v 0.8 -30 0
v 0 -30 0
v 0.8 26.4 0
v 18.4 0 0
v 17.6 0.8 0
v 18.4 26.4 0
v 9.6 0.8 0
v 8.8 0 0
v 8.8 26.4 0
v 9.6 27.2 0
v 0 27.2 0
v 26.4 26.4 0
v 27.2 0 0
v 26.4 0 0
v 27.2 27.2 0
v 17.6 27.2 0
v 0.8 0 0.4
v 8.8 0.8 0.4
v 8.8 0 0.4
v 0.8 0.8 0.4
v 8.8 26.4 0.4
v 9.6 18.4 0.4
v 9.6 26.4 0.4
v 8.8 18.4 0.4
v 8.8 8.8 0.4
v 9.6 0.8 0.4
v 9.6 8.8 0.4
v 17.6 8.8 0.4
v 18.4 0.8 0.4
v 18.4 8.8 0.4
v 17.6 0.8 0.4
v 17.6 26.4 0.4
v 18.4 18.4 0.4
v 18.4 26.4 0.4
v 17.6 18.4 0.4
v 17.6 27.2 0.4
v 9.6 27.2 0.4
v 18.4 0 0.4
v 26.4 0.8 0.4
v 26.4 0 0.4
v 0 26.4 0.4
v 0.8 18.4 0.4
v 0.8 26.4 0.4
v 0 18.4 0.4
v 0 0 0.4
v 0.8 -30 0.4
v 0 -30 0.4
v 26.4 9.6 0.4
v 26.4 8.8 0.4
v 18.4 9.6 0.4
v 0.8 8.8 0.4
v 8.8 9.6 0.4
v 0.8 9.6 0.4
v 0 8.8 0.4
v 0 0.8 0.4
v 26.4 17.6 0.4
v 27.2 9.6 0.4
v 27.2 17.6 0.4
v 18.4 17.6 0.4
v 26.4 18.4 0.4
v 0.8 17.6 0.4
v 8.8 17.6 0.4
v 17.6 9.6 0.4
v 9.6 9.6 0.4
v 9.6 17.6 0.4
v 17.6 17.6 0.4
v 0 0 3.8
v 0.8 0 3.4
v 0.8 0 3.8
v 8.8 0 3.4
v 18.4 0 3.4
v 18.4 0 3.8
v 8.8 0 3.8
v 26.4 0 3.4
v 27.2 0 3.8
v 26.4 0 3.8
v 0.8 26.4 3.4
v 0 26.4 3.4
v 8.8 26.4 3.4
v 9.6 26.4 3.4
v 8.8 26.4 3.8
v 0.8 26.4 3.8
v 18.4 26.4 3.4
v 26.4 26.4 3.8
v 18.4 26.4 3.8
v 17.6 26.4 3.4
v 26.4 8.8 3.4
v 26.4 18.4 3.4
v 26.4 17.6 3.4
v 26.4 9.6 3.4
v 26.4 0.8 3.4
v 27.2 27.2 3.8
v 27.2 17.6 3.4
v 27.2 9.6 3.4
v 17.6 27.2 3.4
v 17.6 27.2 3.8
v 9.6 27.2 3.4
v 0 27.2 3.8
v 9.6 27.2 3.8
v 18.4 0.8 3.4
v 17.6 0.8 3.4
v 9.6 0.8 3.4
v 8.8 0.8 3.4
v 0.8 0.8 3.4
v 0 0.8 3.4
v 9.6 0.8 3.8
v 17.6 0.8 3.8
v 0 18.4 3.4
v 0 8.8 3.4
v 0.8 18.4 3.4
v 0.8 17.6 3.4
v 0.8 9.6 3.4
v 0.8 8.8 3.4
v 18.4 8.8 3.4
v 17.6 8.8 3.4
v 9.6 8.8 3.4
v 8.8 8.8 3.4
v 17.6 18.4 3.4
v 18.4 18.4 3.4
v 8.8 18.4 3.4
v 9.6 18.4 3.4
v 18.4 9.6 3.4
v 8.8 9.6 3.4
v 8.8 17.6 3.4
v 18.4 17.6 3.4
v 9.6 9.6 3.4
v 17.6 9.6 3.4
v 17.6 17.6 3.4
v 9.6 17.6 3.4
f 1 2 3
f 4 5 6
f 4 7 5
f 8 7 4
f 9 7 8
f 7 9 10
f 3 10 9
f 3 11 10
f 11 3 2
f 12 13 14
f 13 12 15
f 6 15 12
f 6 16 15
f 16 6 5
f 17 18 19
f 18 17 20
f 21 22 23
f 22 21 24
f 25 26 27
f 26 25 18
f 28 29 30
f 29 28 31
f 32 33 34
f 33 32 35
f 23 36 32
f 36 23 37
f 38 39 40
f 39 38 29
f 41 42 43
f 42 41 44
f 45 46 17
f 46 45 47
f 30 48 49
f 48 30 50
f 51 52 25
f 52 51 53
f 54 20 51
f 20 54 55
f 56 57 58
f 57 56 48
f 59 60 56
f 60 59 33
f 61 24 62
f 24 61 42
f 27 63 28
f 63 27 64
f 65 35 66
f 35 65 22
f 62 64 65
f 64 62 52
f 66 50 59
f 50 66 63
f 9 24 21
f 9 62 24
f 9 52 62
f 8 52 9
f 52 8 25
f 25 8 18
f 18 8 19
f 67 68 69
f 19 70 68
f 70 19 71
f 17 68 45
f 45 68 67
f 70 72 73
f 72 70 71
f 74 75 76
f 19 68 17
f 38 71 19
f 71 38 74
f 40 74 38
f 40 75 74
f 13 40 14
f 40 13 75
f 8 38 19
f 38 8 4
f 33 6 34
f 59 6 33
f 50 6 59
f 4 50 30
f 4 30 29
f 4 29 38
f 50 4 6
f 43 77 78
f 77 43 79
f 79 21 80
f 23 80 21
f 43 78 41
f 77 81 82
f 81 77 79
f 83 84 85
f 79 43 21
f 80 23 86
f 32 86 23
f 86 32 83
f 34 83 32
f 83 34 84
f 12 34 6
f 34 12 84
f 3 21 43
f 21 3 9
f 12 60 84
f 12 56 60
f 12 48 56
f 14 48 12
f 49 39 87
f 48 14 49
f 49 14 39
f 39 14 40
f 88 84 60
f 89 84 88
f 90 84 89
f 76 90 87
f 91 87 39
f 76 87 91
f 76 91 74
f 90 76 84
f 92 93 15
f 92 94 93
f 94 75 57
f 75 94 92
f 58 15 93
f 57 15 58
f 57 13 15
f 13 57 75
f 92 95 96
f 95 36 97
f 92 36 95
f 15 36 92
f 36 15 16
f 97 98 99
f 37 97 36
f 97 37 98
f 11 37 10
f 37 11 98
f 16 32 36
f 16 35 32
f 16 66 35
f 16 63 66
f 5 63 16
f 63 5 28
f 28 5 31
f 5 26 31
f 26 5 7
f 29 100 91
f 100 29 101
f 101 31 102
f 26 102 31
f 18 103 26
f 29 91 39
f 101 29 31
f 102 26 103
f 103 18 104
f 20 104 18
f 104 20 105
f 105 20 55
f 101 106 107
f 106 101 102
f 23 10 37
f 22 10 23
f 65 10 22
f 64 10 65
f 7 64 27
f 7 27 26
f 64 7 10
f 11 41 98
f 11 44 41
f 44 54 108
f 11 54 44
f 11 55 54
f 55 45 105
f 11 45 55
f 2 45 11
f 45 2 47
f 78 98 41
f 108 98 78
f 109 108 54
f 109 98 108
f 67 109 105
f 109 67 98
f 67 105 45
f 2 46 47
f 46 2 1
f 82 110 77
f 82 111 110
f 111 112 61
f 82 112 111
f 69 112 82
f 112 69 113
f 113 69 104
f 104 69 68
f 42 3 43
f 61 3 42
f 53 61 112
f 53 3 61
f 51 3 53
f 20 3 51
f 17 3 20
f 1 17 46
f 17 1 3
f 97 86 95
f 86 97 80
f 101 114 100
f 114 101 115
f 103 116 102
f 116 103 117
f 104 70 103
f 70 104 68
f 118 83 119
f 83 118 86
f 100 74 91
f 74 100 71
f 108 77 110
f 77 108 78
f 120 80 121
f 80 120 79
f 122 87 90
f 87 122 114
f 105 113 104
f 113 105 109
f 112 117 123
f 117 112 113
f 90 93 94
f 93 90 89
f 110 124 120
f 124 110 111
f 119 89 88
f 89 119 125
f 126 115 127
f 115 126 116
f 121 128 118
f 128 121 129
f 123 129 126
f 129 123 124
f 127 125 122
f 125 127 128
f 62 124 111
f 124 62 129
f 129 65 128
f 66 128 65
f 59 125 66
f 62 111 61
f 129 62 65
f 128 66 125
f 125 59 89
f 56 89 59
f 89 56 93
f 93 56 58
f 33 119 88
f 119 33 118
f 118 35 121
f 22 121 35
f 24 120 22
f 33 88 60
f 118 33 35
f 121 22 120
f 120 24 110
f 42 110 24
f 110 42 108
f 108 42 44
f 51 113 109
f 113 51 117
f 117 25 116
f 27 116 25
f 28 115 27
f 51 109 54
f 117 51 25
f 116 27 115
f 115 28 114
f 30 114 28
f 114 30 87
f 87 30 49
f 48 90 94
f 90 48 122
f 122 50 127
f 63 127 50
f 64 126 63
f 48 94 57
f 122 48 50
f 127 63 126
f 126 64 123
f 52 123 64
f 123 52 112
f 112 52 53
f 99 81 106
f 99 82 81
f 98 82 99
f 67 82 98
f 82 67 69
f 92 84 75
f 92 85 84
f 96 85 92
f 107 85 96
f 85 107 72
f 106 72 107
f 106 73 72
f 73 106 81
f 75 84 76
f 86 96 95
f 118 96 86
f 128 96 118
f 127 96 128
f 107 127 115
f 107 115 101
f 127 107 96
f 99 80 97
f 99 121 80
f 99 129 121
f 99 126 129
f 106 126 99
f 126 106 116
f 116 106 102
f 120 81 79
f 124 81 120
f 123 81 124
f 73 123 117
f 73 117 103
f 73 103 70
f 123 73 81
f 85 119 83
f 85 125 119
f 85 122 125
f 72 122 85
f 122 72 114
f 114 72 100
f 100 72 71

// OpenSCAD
// file: ../../api/v3/reporting.scad
//////////////////////////////////////////////////////////////////////
// LibFile: reporting.scad
// Project: Grid Stack
// FileGroup: API v3 Reporting
// FileSummary: Console report for immutable direct and positive-gap coupons.
// Role: Records the exact environment, dimensions, support strategy, path
//       lengths, qualification status, and deposited-layer counts.
// Requires: API v3 indexes, mathematics, and path generator.
// Exports: report_structural_coupon_object().
//////////////////////////////////////////////////////////////////////

function _bridge_status3(span, process) =
    span <= process[PX3_BRIDGE_MAX]
        ? "within_owner_tested_limit"
        : "exploratory_beyond_owner_tested_limit";

module report_structural_coupon_object(object, report_level = "full") {
    material = object[SCO_MATERIAL];
    nozzle = object[SCO_NOZZLE];
    printer = object[SCO_PRINTER];
    process = object[SCO_PROCESS];
    boundary = object[SCO_BOUNDARY];
    gap = object[SCO_CLEAR_GAP];
    strategy = object[SCO_SUPPORT_STRATEGY];

    echo("--- Grid Stack immutable structural coupon ---");
    echo(str("Object: ", object[SCO_NAME], " revision ", object[SCO_REVISION]));
    echo(str("API/schema: ", object[SCO_REQUIRED_API], "/",
        object[SCO_SCHEMA_VERSION]));
    echo(str("Release/base commit: ", object[SCO_SOURCE_RELEASE], " / ",
        object[SCO_FRAMEWORK_BASE_COMMIT]));
    echo(str("Material/nozzle/printer: ", material[MAT3_FAMILY], " / ",
        nozzle[NZ3_DIAMETER], " mm / ", printer[PRN3_NAME]));
    echo(str("Cells: ", boundary[B3_CELLS_X], " x ", boundary[B3_CELLS_Y]));
    echo(str("Clear spans: ", boundary[B3_CLEAR_SPAN_X], " x ",
        boundary[B3_CLEAR_SPAN_Y], " mm"));
    echo(str("Span status: ",
        _bridge_status3(boundary[B3_CLEAR_SPAN_X], process)));
    echo(str("Outside size: ", boundary_size_x3(boundary, process, nozzle),
        " x ", boundary_size_y3(boundary, process, nozzle), " mm"));
    echo(str("Primitive trace: ", trace_width3(nozzle), " x ",
        trace_height3(process), " mm"));
    echo(str("Structural strand: ", strand_width3(process, nozzle), " x ",
        strand_height3(process), " mm"));
    echo(str("Clear vertical gap: ", gap, " mm"));
    echo(str("Support strategy: ", strategy));
    echo(str("Total modeled height: ", coupon_total_height3(object), " mm"));

    if (report_level == "full") {
        if (strategy == "direct_orthogonal") {
            lower = coupon_path(
                boundary, process, nozzle, 0, object[SCO_LEAD_IN]
            );
            upper = coupon_path(boundary, process, nozzle, 90, 0);
            echo(str("Lower/upper path lengths: ", path_length3(lower),
                " / ", path_length3(upper), " mm"));
            echo(str("Deposited layers: ", 2 * process[PX3_HEIGHT_PASSES]));
        }
        else {
            witness = coupon_path(
                boundary, process, nozzle, 90, object[SCO_LEAD_IN]
            );
            riser = coupon_path(boundary, process, nozzle, 0, 0);
            test = coupon_path(boundary, process, nozzle, 90, 0);
            echo(str("Witness/riser/test path lengths: ",
                path_length3(witness), " / ", path_length3(riser), " / ",
                path_length3(test), " mm"));
            echo(str("Riser deposited layers: ", round(gap_layer_count3(object))));
            echo(str("Total deposited layers: ",
                2 * process[PX3_HEIGHT_PASSES] +
                round(gap_layer_count3(object))));
        }
        echo(str("Status: ", object[SCO_STATUS]));
        echo(str("Notes: ", object[SCO_NOTES]));
    }
}
// file: ../../api/v3/validation.scad
//////////////////////////////////////////////////////////////////////
// LibFile: validation.scad
// Project: Grid Stack
// FileGroup: API v3 Validation
// FileSummary: Validates immutable environment records, count boundaries,
//              support strategy, path continuity, and layer quantization.
// Role: Rejects incompatible or physically floating recipes before geometry
//       is generated.
// Requires: API v3 indexes, mathematics, and path generator.
// Exports: validate_structural_coupon_object().
//////////////////////////////////////////////////////////////////////

module _validate_path3(points, boundary, orientation, lead_in) {
    run_count = orientation == 0
        ? boundary_strand_count_y3(boundary)
        : boundary_strand_count_x3(boundary);

    assert(len(points) == expected_coupon_point_count3(run_count, lead_in),
        "API v3 coupon path has an unexpected point count.");
    assert(!path_has_zero_segment3(points),
        "API v3 coupon path contains a zero-length segment.");
    assert(path_axis_aligned3(points),
        "API v3 coupon path must remain axis-aligned.");
    assert(points[0] != points[len(points) - 1],
        "API v3 coupon path must remain open.");
}

module validate_structural_coupon_object(object) {
    assert(object[SCO_REQUIRED_API] == GRID_STACK_API_VERSION,
        "Saved coupon requires a different Grid Stack API version.");
    assert(object[SCO_SCHEMA_VERSION] == GRID_STACK_COUPON_SCHEMA_VERSION,
        "Saved coupon requires a different coupon schema version.");
    assert(GRID_STACK_RECTANGULAR_FRAMEWORK_VERSION == 2,
        "Saved coupon requires rectangular framework version 2.");

    material = object[SCO_MATERIAL];
    nozzle = object[SCO_NOZZLE];
    printer = object[SCO_PRINTER];
    process = object[SCO_PROCESS];
    boundary = object[SCO_BOUNDARY];
    gap = object[SCO_CLEAR_GAP];
    lead_in = object[SCO_LEAD_IN];
    strategy = object[SCO_SUPPORT_STRATEGY];

    assert(nozzle[NZ3_DIAMETER] > 0,
        "Saved coupon nozzle diameter must be positive.");
    assert(process[PX3_LAYER_H] > 0,
        "Saved coupon layer height must be positive.");
    assert(process[PX3_WIDTH_PASSES] >= 2,
        "Saved coupon structural width requires at least two passes.");
    assert(process[PX3_HEIGHT_PASSES] >= 2,
        "Saved coupon structural height requires at least two layers.");
    assert(process[PX3_MATERIAL] == material[MAT3_NAME],
        "Saved coupon process/material references do not match.");
    assert(process[PX3_NOZZLE] == nozzle[NZ3_NAME],
        "Saved coupon process/nozzle references do not match.");
    assert(process[PX3_PRINTER] == printer[PRN3_NAME],
        "Saved coupon process/printer references do not match.");
    assert(boundary[B3_CELLS_X] > 0 && boundary[B3_CELLS_Y] > 0,
        "Saved coupon cell counts must be positive.");
    assert(boundary[B3_CLEAR_SPAN_X] > 0 &&
           boundary[B3_CLEAR_SPAN_Y] > 0,
        "Saved coupon clear spans must be positive.");
    assert(lead_in >= 0,
        "Saved coupon lead-in cannot be negative.");
    assert(gap >= 0,
        "Saved coupon clear gap cannot be negative.");
    assert(nearly_equal3(gap_layer_count3(object), round(gap_layer_count3(object))),
        "Saved coupon clear gap must equal a whole deposited-layer count.");
    assert(
        (strategy == "direct_orthogonal" && nearly_equal3(gap, 0)) ||
        (strategy == "witness_riser_bridge" && gap > 0),
        "Saved coupon support strategy does not match its clear gap."
    );

    if (strategy == "direct_orthogonal") {
        lower = coupon_path(boundary, process, nozzle, 0, lead_in);
        upper = coupon_path(boundary, process, nozzle, 90, 0);
        _validate_path3(lower, boundary, 0, lead_in);
        _validate_path3(upper, boundary, 90, 0);
        entry = lead_in > 0 ? 1 : 0;
        assert(nearly_equal3(point_distance_2d3(lower[entry], upper[0]), 0),
            "Direct upper path must start on the lower entry crossing.");
    }
    else {
        witness = coupon_path(boundary, process, nozzle, 90, lead_in);
        riser = coupon_path(boundary, process, nozzle, 0, 0);
        test = coupon_path(boundary, process, nozzle, 90, 0);
        _validate_path3(witness, boundary, 90, lead_in);
        _validate_path3(riser, boundary, 0, 0);
        _validate_path3(test, boundary, 90, 0);
        entry = lead_in > 0 ? 1 : 0;
        assert(nearly_equal3(point_distance_2d3(witness[entry], riser[0]), 0),
            "Riser path must start on the witness entry crossing.");
        assert(nearly_equal3(point_distance_2d3(riser[0], test[0]), 0),
            "Upper test path must start on the riser entry crossing.");
        for (i = [0 : len(test) - 1])
            assert(nearly_equal3(point_distance_2d3(test[i], witness[i + entry]), 0),
                "Upper test path must align directly above the witness path.");
    }

    echo("GRID STACK API V3 COUPON VALIDATION: PASS");
}
// file: ../../api/v3/geometry.scad
//////////////////////////////////////////////////////////////////////
// LibFile: geometry.scad
// Project: Grid Stack
// FileGroup: API v3 Printable Geometry
// FileSummary: Creates square-ended structural paths, direct-contact coupons,
//              positive witness/riser/bridge coupons, and simple diagnostics.
// Role: Supplies all geometry used by immutable API v3 recipes without
//       importing mutable workbench geometry.
// Requires: API v3 mathematics and ordered axis-aligned paths.
// Exports: render_direct_coupon(), render_positive_gap_coupon(), and
//          render_coupon_path_debug().
//////////////////////////////////////////////////////////////////////

module _segment_2d3(a, b, width) {
    horizontal = nearly_equal3(a[1], b[1]);
    vertical = nearly_equal3(a[0], b[0]);

    assert(horizontal || vertical,
        "API v3 printable segments must be horizontal or vertical.");
    assert(!nearly_equal3(point_distance_2d3(a, b), 0),
        "API v3 printable segments must have nonzero length.");

    if (horizontal)
        translate([min(a[0], b[0]) - width / 2, a[1] - width / 2])
            square([abs(b[0] - a[0]) + width, width]);
    else
        translate([a[0] - width / 2, min(a[1], b[1]) - width / 2])
            square([width, abs(b[1] - a[1]) + width]);
}

module _path_2d3(points, width) {
    union()
        for (i = [0 : len(points) - 2])
            _segment_2d3(points[i], points[i + 1], width);
}

module _structural_path3(points, process, nozzle) {
    linear_extrude(height = strand_height3(process), convexity = 10)
        _path_2d3(points, strand_width3(process, nozzle));
}

module render_direct_coupon(lower, upper, process, nozzle) {
    union() {
        _structural_path3(lower, process, nozzle);
        translate([0, 0, strand_height3(process)])
            _structural_path3(upper, process, nozzle);
    }
}

module render_positive_gap_coupon(
    witness, riser, test, process, nozzle, clear_gap
) {
    union() {
        _structural_path3(witness, process, nozzle);

        translate([0, 0, strand_height3(process)])
            linear_extrude(height = clear_gap, convexity = 10)
                _path_2d3(riser, strand_width3(process, nozzle));

        translate([0, 0, strand_height3(process) + clear_gap])
            _structural_path3(test, process, nozzle);
    }
}

module _debug_path3(points, z, width) {
    translate([0, 0, z])
        linear_extrude(height = 0.04)
            _path_2d3(points, width);
}

module render_coupon_path_debug(
    lower, upper, riser, process, clear_gap = 0
) {
    width = max(0.12, trace_height3(process));
    _debug_path3(lower, 0, width);
    if (len(riser) > 0)
        _debug_path3(riser, strand_height3(process), width);
    _debug_path3(
        upper,
        strand_height3(process) + clear_gap,
        width
    );
}
// file: ../../api/v3/paths.scad
//////////////////////////////////////////////////////////////////////
// LibFile: paths.scad
// Project: Grid Stack
// FileGroup: API v3 Path Generation
// FileSummary: Generates one open rectangular serpentine centerline from a
//              count boundary for X- or Y-running structural paths.
// Role: Preserves parallel runs, square connectors, optional single lead-in,
//       and one uninterrupted ordered point list per deposited layer.
// Requires: API v3 indexes and mathematics.
// Exports: coupon_path() and expected_coupon_point_count3().
//////////////////////////////////////////////////////////////////////

function _x_rows3(row, count, x_min, x_max, y_min, pitch) =
    row >= count
        ? []
        : let(
            y = y_min + row * pitch,
            x_end = row % 2 == 0 ? x_max : x_min,
            row_end = [x_end, y],
            connector_end = [x_end, y + pitch]
        )
        concat(
            [row_end],
            row < count - 1 ? [connector_end] : [],
            _x_rows3(row + 1, count, x_min, x_max, y_min, pitch)
        );

function _y_columns3(column, count, x_min, y_min, y_max, pitch) =
    column >= count
        ? []
        : let(
            x = x_min + column * pitch,
            y_end = column % 2 == 0 ? y_max : y_min,
            column_end = [x, y_end],
            connector_end = [x + pitch, y_end]
        )
        concat(
            [column_end],
            column < count - 1 ? [connector_end] : [],
            _y_columns3(column + 1, count, x_min, y_min, y_max, pitch)
        );

function expected_coupon_point_count3(run_count, lead_in = 0) =
    2 * run_count + (lead_in > 0 ? 1 : 0);

function coupon_path(
    boundary, process, nozzle, orientation = 0, lead_in = 0
) =
    assert(orientation == 0 || orientation == 90,
        "API v3 coupon orientation must be 0 or 90 degrees.")
    assert(lead_in >= 0,
        "API v3 coupon lead-in cannot be negative.")
    let(
        width = strand_width3(process, nozzle),
        x_min = width / 2,
        y_min = width / 2,
        x_max = boundary_size_x3(boundary, process, nozzle) - width / 2,
        y_max = boundary_size_y3(boundary, process, nozzle) - width / 2,
        entry = [x_min, y_min],
        prefix = lead_in > 0
            ? (orientation == 0
                ? [[x_min - lead_in, y_min], entry]
                : [[x_min, y_min - lead_in], entry])
            : [entry]
    )
    orientation == 0
        ? concat(
            prefix,
            _x_rows3(
                0, boundary_strand_count_y3(boundary),
                x_min, x_max, y_min,
                boundary_pitch_y3(boundary, process, nozzle)
            )
        )
        : concat(
            prefix,
            _y_columns3(
                0, boundary_strand_count_x3(boundary),
                x_min, y_min, y_max,
                boundary_pitch_x3(boundary, process, nozzle)
            )
        );
// file: ../../api/v3/math.scad
//////////////////////////////////////////////////////////////////////
// LibFile: math.scad
// Project: Grid Stack
// FileGroup: API v3 Mathematics
// FileSummary: Pure trace, strand, boundary, path, and layer-count helpers.
// Role: Keeps API v3 calculations isolated and reproducible without importing
//       mutable workbench mathematics.
// Requires: API v3 indexes.
// Exports: nearly_equal3(), trace/strand dimensions, boundary dimensions,
//          path inspection, gap-layer count, and total-height helpers.
//////////////////////////////////////////////////////////////////////

function nearly_equal3(a, b, epsilon = 0.000001) = abs(a - b) <= epsilon;

function trace_width3(nozzle) = nozzle[NZ3_DIAMETER];
function trace_height3(process) = process[PX3_LAYER_H];
function strand_width3(process, nozzle) =
    trace_width3(nozzle) * process[PX3_WIDTH_PASSES];
function strand_height3(process) =
    trace_height3(process) * process[PX3_HEIGHT_PASSES];

function boundary_strand_count_x3(boundary) = boundary[B3_CELLS_X] + 1;
function boundary_strand_count_y3(boundary) = boundary[B3_CELLS_Y] + 1;
function boundary_pitch_x3(boundary, process, nozzle) =
    boundary[B3_CLEAR_SPAN_X] + strand_width3(process, nozzle);
function boundary_pitch_y3(boundary, process, nozzle) =
    boundary[B3_CLEAR_SPAN_Y] + strand_width3(process, nozzle);
function boundary_size_x3(boundary, process, nozzle) =
    boundary[B3_CELLS_X] * boundary[B3_CLEAR_SPAN_X] +
    boundary_strand_count_x3(boundary) * strand_width3(process, nozzle);
function boundary_size_y3(boundary, process, nozzle) =
    boundary[B3_CELLS_Y] * boundary[B3_CLEAR_SPAN_Y] +
    boundary_strand_count_y3(boundary) * strand_width3(process, nozzle);

function point_distance_2d3(a, b) =
    sqrt(pow(b[0] - a[0], 2) + pow(b[1] - a[1], 2));
function path_length3(points, i = 0) =
    i >= len(points) - 1
        ? 0
        : point_distance_2d3(points[i], points[i + 1]) +
          path_length3(points, i + 1);
function path_has_zero_segment3(points, i = 0) =
    i >= len(points) - 1
        ? false
        : nearly_equal3(point_distance_2d3(points[i], points[i + 1]), 0)
            ? true
            : path_has_zero_segment3(points, i + 1);
function segment_axis_aligned3(a, b) =
    nearly_equal3(a[0], b[0]) || nearly_equal3(a[1], b[1]);
function path_axis_aligned3(points, i = 0) =
    i >= len(points) - 1
        ? true
        : segment_axis_aligned3(points[i], points[i + 1]) &&
          path_axis_aligned3(points, i + 1);

function gap_layer_count3(object) =
    object[SCO_CLEAR_GAP] / trace_height3(object[SCO_PROCESS]);
function coupon_total_height3(object) =
    2 * strand_height3(object[SCO_PROCESS]) + object[SCO_CLEAR_GAP];
// file: ../../api/v3/schema.scad
//////////////////////////////////////////////////////////////////////
// LibFile: schema.scad
// Project: Grid Stack
// FileGroup: API v3 Data Model
// FileSummary: Constructors for self-contained immutable structural coupons.
// Role: Makes every geometry-affecting environment and object value explicit
//       inside the saved recipe rather than resolving mutable catalog names.
// Exports: material_spec(), nozzle_spec(), printer_spec(),
//          structural_process_profile(), count_boundary(), and
//          structural_coupon_object().
//////////////////////////////////////////////////////////////////////

function material_spec(
    name, family, flexibility, status = "in_use", notes = ""
) = [name, family, flexibility, status, notes];

function nozzle_spec(
    name, diameter, construction = "brass", status = "in_use", notes = ""
) = [name, diameter, construction, status, notes];

function printer_spec(
    name,
    manufacturer = "",
    model = "",
    motion_system = "",
    build_surface = "",
    status = "unrecorded",
    notes = ""
) = [
    name, manufacturer, model, motion_system,
    build_surface, status, notes
];

function structural_process_profile(
    name,
    material_name,
    nozzle_name,
    printer_name,
    layer_height,
    width_passes,
    height_passes,
    bridge_max,
    qualification,
    revision,
    notes = ""
) = [
    name, material_name, nozzle_name, printer_name,
    layer_height, width_passes, height_passes, bridge_max,
    qualification, revision, notes
];

// Function: count_boundary()
// Synopsis: Stores clear-opening counts and clear spans for one rectangle.
function count_boundary(
    name,
    cells_x,
    cells_y,
    clear_span_x,
    clear_span_y,
    notes = ""
) = [name, cells_x, cells_y, clear_span_x, clear_span_y, notes];

// Function: structural_coupon_object()
// Synopsis: Constructs one permanent coupon recipe.
// Description:
//   framework_base_commit records the last accepted repository state used to
//   begin the API implementation. The Git commit containing this recipe is the
//   authoritative complete source; a file cannot embed its own future hash.
function structural_coupon_object(
    name,
    revision,
    required_api_version,
    coupon_schema_version,
    source_release,
    framework_base_commit,
    material,
    nozzle,
    printer,
    process,
    boundary,
    clear_vertical_gap,
    lead_in,
    support_strategy,
    status = "calibration",
    notes = ""
) = [
    name,
    revision,
    required_api_version,
    coupon_schema_version,
    source_release,
    framework_base_commit,
    material,
    nozzle,
    printer,
    process,
    boundary,
    clear_vertical_gap,
    lead_in,
    support_strategy,
    status,
    notes
];
// file: ../../api/v3/indices.scad
//////////////////////////////////////////////////////////////////////
// LibFile: indices.scad
// Project: Grid Stack
// FileGroup: API v3 Data Model
// FileSummary: Named indexes for immutable structural-coupon records.
// Role: Prevents unexplained numeric indexes from entering saved recipes and
//       keeps API version 3 independent of mutable workbench indexes.
// Exports: MAT3_*, NZ3_*, PRN3_*, PX3_*, B3_*, and SCO_* constants.
//////////////////////////////////////////////////////////////////////

MAT3_NAME = 0;
MAT3_FAMILY = 1;
MAT3_FLEXIBILITY = 2;
MAT3_STATUS = 3;
MAT3_NOTES = 4;

NZ3_NAME = 0;
NZ3_DIAMETER = 1;
NZ3_CONSTRUCTION = 2;
NZ3_STATUS = 3;
NZ3_NOTES = 4;

PRN3_NAME = 0;
PRN3_MANUFACTURER = 1;
PRN3_MODEL = 2;
PRN3_MOTION_SYSTEM = 3;
PRN3_BUILD_SURFACE = 4;
PRN3_STATUS = 5;
PRN3_NOTES = 6;

PX3_NAME = 0;
PX3_MATERIAL = 1;
PX3_NOZZLE = 2;
PX3_PRINTER = 3;
PX3_LAYER_H = 4;
PX3_WIDTH_PASSES = 5;
PX3_HEIGHT_PASSES = 6;
PX3_BRIDGE_MAX = 7;
PX3_QUALIFICATION = 8;
PX3_REVISION = 9;
PX3_NOTES = 10;

B3_NAME = 0;
B3_CELLS_X = 1;
B3_CELLS_Y = 2;
B3_CLEAR_SPAN_X = 3;
B3_CLEAR_SPAN_Y = 4;
B3_NOTES = 5;

SCO_NAME = 0;
SCO_REVISION = 1;
SCO_REQUIRED_API = 2;
SCO_SCHEMA_VERSION = 3;
SCO_SOURCE_RELEASE = 4;
SCO_FRAMEWORK_BASE_COMMIT = 5;
SCO_MATERIAL = 6;
SCO_NOZZLE = 7;
SCO_PRINTER = 8;
SCO_PROCESS = 9;
SCO_BOUNDARY = 10;
SCO_CLEAR_GAP = 11;
SCO_LEAD_IN = 12;
SCO_SUPPORT_STRATEGY = 13;
SCO_STATUS = 14;
SCO_NOTES = 15;
// file: ../../api/grid_stack_v3.scad
//////////////////////////////////////////////////////////////////////
// LibFile: grid_stack_v3.scad
// Project: Grid Stack
// FileGroup: Versioned Public Interface
// FileSummary: Immutable API version 3 for rectangular count-boundary
//              structural coupons, including positive witness/riser gaps.
// Role: Reconstructs saved coupon recipes without Customizer state or mutable
//       workbench catalogs. Incompatible behavior requires a new API file.
// Exports: API/schema constants, record constructors, validation, reporting,
//          and structural_coupon_render().
//////////////////////////////////////////////////////////////////////

GRID_STACK_API_VERSION = 3;
GRID_STACK_COUPON_SCHEMA_VERSION = 1;
GRID_STACK_RECTANGULAR_FRAMEWORK_VERSION = 2;
GRID_STACK_RELEASE = "1.0.0";

include <v3/indices.scad>
include <v3/schema.scad>
include <v3/math.scad>
include <v3/paths.scad>
include <v3/geometry.scad>
include <v3/validation.scad>
include <v3/reporting.scad>

// Module: structural_coupon_render()
// Synopsis: Validates, reports, and renders one immutable coupon recipe.
// Arguments:
//   object = Record returned by structural_coupon_object().
//   mode = print, path_debug, or report_only.
//   report_level = summary or full.
module structural_coupon_render(
    object,
    mode = "print",
    report_level = "full"
) {
    validate_structural_coupon_object(object);
    report_structural_coupon_object(object, report_level);

    boundary = object[SCO_BOUNDARY];
    process = object[SCO_PROCESS];
    nozzle = object[SCO_NOZZLE];
    lead_in = object[SCO_LEAD_IN];
    clear_gap = object[SCO_CLEAR_GAP];
    strategy = object[SCO_SUPPORT_STRATEGY];

    if (strategy == "direct_orthogonal") {
        lower = coupon_path(boundary, process, nozzle, 0, lead_in);
        upper = coupon_path(boundary, process, nozzle, 90, 0);

        if (mode == "print")
            render_direct_coupon(lower, upper, process, nozzle);
        else if (mode == "path_debug")
            render_coupon_path_debug(lower, upper, [], process);
        else if (mode == "report_only")
            echo("Grid Stack API v3 report-only mode: no geometry generated.");
        else
            assert(false, str("Unknown API v3 render mode: ", mode));
    }
    else if (strategy == "witness_riser_bridge") {
        witness = coupon_path(boundary, process, nozzle, 90, lead_in);
        riser = coupon_path(boundary, process, nozzle, 0, 0);
        test = coupon_path(boundary, process, nozzle, 90, 0);

        if (mode == "print")
            render_positive_gap_coupon(
                witness, riser, test, process, nozzle, clear_gap
            );
        else if (mode == "path_debug")
            render_coupon_path_debug(witness, test, riser, process, clear_gap);
        else if (mode == "report_only")
            echo("Grid Stack API v3 report-only mode: no geometry generated.");
        else
            assert(false, str("Unknown API v3 render mode: ", mode));
    }
    else
        assert(false, str("Unknown coupon support strategy: ", strategy));
}
// main file
//////////////////////////////////////////////////////////////////////
// LibFile: coupon-3x3-span8-gap3-pla-plus-0p4-v1.scad
// Project: Grid Stack
// FileGroup: Immutable Structural Coupon
// FileSummary: 3 x 3 PLA+ coupon with 8 mm clear XY spans and 3 mm
//              clear vertical gap using witness_riser_bridge geometry.
// Role: Permanently reconstructs one calibration object without Customizer
//       state or mutable workbench catalog lookup.
// FrameworkBaseCommit: 4b5e564
// Requires: Grid Stack API version 3 and coupon schema version 1.
// Output: Printable continuous-path structural coupon geometry.
//////////////////////////////////////////////////////////////////////

include <../../api/grid_stack_v3.scad>

assert(GRID_STACK_API_VERSION == 3,
    "This recipe requires Grid Stack API version 3.");
assert(GRID_STACK_COUPON_SCHEMA_VERSION == 1,
    "This recipe requires coupon schema version 1.");
assert(GRID_STACK_RECTANGULAR_FRAMEWORK_VERSION == 2,
    "This recipe requires rectangular framework version 2.");

saved_material = material_spec(
    name = "PLA_PLUS",
    family = "PLA+",
    flexibility = "rigid",
    status = "in_use",
    notes = "Exact material family selected for the coupon matrix."
);

saved_nozzle = nozzle_spec(
    name = "BRASS_0P4",
    diameter = 0.4,
    construction = "brass",
    status = "in_use",
    notes = "Nominal nozzle diameter used to derive the 0.8 mm strand width."
);

saved_printer = printer_spec(
    name = "UNRECORDED_PRINTER_R1",
    manufacturer = "",
    model = "",
    motion_system = "",
    build_surface = "",
    status = "unrecorded",
    notes = "Printer identity was not frozen with this coupon framework."
);

saved_process = structural_process_profile(
    name = "PLA_PLUS_0P4_LH0P2_W2_H2_R1",
    material_name = "PLA_PLUS",
    nozzle_name = "BRASS_0P4",
    printer_name = "UNRECORDED_PRINTER_R1",
    layer_height = 0.2,
    width_passes = 2,
    height_passes = 2,
    bridge_max = 6,
    qualification = "owner_tested_to_6mm",
    revision = 1,
    notes = "Primitive trace 0.4 x 0.2 mm; structural strand 0.8 x 0.4 mm."
);

saved_boundary = count_boundary(
    name = "COUNT_3X3_SPAN8",
    cells_x = 3,
    cells_y = 3,
    clear_span_x = 8,
    clear_span_y = 8,
    notes = "Outside dimensions derive from four strands and three clear openings."
);

saved_coupon = structural_coupon_object(
    name = "COUPON_3X3_SPAN8_GAP3_PLA_PLUS_0P4_V1",
    revision = 1,
    required_api_version = 3,
    coupon_schema_version = 1,
    source_release = "1.0.0",
    framework_base_commit = "4b5e564",
    material = saved_material,
    nozzle = saved_nozzle,
    printer = saved_printer,
    process = saved_process,
    boundary = saved_boundary,
    clear_vertical_gap = 3,
    lead_in = 30,
    support_strategy = "witness_riser_bridge",
    status = "calibration_unprinted",
    notes = "Calibration recipe generated from the frozen Batch 010 framework; record results in a new revision after printing."
);

structural_coupon_render(
    saved_coupon,
    mode = "print",
    report_level = "full"
);
